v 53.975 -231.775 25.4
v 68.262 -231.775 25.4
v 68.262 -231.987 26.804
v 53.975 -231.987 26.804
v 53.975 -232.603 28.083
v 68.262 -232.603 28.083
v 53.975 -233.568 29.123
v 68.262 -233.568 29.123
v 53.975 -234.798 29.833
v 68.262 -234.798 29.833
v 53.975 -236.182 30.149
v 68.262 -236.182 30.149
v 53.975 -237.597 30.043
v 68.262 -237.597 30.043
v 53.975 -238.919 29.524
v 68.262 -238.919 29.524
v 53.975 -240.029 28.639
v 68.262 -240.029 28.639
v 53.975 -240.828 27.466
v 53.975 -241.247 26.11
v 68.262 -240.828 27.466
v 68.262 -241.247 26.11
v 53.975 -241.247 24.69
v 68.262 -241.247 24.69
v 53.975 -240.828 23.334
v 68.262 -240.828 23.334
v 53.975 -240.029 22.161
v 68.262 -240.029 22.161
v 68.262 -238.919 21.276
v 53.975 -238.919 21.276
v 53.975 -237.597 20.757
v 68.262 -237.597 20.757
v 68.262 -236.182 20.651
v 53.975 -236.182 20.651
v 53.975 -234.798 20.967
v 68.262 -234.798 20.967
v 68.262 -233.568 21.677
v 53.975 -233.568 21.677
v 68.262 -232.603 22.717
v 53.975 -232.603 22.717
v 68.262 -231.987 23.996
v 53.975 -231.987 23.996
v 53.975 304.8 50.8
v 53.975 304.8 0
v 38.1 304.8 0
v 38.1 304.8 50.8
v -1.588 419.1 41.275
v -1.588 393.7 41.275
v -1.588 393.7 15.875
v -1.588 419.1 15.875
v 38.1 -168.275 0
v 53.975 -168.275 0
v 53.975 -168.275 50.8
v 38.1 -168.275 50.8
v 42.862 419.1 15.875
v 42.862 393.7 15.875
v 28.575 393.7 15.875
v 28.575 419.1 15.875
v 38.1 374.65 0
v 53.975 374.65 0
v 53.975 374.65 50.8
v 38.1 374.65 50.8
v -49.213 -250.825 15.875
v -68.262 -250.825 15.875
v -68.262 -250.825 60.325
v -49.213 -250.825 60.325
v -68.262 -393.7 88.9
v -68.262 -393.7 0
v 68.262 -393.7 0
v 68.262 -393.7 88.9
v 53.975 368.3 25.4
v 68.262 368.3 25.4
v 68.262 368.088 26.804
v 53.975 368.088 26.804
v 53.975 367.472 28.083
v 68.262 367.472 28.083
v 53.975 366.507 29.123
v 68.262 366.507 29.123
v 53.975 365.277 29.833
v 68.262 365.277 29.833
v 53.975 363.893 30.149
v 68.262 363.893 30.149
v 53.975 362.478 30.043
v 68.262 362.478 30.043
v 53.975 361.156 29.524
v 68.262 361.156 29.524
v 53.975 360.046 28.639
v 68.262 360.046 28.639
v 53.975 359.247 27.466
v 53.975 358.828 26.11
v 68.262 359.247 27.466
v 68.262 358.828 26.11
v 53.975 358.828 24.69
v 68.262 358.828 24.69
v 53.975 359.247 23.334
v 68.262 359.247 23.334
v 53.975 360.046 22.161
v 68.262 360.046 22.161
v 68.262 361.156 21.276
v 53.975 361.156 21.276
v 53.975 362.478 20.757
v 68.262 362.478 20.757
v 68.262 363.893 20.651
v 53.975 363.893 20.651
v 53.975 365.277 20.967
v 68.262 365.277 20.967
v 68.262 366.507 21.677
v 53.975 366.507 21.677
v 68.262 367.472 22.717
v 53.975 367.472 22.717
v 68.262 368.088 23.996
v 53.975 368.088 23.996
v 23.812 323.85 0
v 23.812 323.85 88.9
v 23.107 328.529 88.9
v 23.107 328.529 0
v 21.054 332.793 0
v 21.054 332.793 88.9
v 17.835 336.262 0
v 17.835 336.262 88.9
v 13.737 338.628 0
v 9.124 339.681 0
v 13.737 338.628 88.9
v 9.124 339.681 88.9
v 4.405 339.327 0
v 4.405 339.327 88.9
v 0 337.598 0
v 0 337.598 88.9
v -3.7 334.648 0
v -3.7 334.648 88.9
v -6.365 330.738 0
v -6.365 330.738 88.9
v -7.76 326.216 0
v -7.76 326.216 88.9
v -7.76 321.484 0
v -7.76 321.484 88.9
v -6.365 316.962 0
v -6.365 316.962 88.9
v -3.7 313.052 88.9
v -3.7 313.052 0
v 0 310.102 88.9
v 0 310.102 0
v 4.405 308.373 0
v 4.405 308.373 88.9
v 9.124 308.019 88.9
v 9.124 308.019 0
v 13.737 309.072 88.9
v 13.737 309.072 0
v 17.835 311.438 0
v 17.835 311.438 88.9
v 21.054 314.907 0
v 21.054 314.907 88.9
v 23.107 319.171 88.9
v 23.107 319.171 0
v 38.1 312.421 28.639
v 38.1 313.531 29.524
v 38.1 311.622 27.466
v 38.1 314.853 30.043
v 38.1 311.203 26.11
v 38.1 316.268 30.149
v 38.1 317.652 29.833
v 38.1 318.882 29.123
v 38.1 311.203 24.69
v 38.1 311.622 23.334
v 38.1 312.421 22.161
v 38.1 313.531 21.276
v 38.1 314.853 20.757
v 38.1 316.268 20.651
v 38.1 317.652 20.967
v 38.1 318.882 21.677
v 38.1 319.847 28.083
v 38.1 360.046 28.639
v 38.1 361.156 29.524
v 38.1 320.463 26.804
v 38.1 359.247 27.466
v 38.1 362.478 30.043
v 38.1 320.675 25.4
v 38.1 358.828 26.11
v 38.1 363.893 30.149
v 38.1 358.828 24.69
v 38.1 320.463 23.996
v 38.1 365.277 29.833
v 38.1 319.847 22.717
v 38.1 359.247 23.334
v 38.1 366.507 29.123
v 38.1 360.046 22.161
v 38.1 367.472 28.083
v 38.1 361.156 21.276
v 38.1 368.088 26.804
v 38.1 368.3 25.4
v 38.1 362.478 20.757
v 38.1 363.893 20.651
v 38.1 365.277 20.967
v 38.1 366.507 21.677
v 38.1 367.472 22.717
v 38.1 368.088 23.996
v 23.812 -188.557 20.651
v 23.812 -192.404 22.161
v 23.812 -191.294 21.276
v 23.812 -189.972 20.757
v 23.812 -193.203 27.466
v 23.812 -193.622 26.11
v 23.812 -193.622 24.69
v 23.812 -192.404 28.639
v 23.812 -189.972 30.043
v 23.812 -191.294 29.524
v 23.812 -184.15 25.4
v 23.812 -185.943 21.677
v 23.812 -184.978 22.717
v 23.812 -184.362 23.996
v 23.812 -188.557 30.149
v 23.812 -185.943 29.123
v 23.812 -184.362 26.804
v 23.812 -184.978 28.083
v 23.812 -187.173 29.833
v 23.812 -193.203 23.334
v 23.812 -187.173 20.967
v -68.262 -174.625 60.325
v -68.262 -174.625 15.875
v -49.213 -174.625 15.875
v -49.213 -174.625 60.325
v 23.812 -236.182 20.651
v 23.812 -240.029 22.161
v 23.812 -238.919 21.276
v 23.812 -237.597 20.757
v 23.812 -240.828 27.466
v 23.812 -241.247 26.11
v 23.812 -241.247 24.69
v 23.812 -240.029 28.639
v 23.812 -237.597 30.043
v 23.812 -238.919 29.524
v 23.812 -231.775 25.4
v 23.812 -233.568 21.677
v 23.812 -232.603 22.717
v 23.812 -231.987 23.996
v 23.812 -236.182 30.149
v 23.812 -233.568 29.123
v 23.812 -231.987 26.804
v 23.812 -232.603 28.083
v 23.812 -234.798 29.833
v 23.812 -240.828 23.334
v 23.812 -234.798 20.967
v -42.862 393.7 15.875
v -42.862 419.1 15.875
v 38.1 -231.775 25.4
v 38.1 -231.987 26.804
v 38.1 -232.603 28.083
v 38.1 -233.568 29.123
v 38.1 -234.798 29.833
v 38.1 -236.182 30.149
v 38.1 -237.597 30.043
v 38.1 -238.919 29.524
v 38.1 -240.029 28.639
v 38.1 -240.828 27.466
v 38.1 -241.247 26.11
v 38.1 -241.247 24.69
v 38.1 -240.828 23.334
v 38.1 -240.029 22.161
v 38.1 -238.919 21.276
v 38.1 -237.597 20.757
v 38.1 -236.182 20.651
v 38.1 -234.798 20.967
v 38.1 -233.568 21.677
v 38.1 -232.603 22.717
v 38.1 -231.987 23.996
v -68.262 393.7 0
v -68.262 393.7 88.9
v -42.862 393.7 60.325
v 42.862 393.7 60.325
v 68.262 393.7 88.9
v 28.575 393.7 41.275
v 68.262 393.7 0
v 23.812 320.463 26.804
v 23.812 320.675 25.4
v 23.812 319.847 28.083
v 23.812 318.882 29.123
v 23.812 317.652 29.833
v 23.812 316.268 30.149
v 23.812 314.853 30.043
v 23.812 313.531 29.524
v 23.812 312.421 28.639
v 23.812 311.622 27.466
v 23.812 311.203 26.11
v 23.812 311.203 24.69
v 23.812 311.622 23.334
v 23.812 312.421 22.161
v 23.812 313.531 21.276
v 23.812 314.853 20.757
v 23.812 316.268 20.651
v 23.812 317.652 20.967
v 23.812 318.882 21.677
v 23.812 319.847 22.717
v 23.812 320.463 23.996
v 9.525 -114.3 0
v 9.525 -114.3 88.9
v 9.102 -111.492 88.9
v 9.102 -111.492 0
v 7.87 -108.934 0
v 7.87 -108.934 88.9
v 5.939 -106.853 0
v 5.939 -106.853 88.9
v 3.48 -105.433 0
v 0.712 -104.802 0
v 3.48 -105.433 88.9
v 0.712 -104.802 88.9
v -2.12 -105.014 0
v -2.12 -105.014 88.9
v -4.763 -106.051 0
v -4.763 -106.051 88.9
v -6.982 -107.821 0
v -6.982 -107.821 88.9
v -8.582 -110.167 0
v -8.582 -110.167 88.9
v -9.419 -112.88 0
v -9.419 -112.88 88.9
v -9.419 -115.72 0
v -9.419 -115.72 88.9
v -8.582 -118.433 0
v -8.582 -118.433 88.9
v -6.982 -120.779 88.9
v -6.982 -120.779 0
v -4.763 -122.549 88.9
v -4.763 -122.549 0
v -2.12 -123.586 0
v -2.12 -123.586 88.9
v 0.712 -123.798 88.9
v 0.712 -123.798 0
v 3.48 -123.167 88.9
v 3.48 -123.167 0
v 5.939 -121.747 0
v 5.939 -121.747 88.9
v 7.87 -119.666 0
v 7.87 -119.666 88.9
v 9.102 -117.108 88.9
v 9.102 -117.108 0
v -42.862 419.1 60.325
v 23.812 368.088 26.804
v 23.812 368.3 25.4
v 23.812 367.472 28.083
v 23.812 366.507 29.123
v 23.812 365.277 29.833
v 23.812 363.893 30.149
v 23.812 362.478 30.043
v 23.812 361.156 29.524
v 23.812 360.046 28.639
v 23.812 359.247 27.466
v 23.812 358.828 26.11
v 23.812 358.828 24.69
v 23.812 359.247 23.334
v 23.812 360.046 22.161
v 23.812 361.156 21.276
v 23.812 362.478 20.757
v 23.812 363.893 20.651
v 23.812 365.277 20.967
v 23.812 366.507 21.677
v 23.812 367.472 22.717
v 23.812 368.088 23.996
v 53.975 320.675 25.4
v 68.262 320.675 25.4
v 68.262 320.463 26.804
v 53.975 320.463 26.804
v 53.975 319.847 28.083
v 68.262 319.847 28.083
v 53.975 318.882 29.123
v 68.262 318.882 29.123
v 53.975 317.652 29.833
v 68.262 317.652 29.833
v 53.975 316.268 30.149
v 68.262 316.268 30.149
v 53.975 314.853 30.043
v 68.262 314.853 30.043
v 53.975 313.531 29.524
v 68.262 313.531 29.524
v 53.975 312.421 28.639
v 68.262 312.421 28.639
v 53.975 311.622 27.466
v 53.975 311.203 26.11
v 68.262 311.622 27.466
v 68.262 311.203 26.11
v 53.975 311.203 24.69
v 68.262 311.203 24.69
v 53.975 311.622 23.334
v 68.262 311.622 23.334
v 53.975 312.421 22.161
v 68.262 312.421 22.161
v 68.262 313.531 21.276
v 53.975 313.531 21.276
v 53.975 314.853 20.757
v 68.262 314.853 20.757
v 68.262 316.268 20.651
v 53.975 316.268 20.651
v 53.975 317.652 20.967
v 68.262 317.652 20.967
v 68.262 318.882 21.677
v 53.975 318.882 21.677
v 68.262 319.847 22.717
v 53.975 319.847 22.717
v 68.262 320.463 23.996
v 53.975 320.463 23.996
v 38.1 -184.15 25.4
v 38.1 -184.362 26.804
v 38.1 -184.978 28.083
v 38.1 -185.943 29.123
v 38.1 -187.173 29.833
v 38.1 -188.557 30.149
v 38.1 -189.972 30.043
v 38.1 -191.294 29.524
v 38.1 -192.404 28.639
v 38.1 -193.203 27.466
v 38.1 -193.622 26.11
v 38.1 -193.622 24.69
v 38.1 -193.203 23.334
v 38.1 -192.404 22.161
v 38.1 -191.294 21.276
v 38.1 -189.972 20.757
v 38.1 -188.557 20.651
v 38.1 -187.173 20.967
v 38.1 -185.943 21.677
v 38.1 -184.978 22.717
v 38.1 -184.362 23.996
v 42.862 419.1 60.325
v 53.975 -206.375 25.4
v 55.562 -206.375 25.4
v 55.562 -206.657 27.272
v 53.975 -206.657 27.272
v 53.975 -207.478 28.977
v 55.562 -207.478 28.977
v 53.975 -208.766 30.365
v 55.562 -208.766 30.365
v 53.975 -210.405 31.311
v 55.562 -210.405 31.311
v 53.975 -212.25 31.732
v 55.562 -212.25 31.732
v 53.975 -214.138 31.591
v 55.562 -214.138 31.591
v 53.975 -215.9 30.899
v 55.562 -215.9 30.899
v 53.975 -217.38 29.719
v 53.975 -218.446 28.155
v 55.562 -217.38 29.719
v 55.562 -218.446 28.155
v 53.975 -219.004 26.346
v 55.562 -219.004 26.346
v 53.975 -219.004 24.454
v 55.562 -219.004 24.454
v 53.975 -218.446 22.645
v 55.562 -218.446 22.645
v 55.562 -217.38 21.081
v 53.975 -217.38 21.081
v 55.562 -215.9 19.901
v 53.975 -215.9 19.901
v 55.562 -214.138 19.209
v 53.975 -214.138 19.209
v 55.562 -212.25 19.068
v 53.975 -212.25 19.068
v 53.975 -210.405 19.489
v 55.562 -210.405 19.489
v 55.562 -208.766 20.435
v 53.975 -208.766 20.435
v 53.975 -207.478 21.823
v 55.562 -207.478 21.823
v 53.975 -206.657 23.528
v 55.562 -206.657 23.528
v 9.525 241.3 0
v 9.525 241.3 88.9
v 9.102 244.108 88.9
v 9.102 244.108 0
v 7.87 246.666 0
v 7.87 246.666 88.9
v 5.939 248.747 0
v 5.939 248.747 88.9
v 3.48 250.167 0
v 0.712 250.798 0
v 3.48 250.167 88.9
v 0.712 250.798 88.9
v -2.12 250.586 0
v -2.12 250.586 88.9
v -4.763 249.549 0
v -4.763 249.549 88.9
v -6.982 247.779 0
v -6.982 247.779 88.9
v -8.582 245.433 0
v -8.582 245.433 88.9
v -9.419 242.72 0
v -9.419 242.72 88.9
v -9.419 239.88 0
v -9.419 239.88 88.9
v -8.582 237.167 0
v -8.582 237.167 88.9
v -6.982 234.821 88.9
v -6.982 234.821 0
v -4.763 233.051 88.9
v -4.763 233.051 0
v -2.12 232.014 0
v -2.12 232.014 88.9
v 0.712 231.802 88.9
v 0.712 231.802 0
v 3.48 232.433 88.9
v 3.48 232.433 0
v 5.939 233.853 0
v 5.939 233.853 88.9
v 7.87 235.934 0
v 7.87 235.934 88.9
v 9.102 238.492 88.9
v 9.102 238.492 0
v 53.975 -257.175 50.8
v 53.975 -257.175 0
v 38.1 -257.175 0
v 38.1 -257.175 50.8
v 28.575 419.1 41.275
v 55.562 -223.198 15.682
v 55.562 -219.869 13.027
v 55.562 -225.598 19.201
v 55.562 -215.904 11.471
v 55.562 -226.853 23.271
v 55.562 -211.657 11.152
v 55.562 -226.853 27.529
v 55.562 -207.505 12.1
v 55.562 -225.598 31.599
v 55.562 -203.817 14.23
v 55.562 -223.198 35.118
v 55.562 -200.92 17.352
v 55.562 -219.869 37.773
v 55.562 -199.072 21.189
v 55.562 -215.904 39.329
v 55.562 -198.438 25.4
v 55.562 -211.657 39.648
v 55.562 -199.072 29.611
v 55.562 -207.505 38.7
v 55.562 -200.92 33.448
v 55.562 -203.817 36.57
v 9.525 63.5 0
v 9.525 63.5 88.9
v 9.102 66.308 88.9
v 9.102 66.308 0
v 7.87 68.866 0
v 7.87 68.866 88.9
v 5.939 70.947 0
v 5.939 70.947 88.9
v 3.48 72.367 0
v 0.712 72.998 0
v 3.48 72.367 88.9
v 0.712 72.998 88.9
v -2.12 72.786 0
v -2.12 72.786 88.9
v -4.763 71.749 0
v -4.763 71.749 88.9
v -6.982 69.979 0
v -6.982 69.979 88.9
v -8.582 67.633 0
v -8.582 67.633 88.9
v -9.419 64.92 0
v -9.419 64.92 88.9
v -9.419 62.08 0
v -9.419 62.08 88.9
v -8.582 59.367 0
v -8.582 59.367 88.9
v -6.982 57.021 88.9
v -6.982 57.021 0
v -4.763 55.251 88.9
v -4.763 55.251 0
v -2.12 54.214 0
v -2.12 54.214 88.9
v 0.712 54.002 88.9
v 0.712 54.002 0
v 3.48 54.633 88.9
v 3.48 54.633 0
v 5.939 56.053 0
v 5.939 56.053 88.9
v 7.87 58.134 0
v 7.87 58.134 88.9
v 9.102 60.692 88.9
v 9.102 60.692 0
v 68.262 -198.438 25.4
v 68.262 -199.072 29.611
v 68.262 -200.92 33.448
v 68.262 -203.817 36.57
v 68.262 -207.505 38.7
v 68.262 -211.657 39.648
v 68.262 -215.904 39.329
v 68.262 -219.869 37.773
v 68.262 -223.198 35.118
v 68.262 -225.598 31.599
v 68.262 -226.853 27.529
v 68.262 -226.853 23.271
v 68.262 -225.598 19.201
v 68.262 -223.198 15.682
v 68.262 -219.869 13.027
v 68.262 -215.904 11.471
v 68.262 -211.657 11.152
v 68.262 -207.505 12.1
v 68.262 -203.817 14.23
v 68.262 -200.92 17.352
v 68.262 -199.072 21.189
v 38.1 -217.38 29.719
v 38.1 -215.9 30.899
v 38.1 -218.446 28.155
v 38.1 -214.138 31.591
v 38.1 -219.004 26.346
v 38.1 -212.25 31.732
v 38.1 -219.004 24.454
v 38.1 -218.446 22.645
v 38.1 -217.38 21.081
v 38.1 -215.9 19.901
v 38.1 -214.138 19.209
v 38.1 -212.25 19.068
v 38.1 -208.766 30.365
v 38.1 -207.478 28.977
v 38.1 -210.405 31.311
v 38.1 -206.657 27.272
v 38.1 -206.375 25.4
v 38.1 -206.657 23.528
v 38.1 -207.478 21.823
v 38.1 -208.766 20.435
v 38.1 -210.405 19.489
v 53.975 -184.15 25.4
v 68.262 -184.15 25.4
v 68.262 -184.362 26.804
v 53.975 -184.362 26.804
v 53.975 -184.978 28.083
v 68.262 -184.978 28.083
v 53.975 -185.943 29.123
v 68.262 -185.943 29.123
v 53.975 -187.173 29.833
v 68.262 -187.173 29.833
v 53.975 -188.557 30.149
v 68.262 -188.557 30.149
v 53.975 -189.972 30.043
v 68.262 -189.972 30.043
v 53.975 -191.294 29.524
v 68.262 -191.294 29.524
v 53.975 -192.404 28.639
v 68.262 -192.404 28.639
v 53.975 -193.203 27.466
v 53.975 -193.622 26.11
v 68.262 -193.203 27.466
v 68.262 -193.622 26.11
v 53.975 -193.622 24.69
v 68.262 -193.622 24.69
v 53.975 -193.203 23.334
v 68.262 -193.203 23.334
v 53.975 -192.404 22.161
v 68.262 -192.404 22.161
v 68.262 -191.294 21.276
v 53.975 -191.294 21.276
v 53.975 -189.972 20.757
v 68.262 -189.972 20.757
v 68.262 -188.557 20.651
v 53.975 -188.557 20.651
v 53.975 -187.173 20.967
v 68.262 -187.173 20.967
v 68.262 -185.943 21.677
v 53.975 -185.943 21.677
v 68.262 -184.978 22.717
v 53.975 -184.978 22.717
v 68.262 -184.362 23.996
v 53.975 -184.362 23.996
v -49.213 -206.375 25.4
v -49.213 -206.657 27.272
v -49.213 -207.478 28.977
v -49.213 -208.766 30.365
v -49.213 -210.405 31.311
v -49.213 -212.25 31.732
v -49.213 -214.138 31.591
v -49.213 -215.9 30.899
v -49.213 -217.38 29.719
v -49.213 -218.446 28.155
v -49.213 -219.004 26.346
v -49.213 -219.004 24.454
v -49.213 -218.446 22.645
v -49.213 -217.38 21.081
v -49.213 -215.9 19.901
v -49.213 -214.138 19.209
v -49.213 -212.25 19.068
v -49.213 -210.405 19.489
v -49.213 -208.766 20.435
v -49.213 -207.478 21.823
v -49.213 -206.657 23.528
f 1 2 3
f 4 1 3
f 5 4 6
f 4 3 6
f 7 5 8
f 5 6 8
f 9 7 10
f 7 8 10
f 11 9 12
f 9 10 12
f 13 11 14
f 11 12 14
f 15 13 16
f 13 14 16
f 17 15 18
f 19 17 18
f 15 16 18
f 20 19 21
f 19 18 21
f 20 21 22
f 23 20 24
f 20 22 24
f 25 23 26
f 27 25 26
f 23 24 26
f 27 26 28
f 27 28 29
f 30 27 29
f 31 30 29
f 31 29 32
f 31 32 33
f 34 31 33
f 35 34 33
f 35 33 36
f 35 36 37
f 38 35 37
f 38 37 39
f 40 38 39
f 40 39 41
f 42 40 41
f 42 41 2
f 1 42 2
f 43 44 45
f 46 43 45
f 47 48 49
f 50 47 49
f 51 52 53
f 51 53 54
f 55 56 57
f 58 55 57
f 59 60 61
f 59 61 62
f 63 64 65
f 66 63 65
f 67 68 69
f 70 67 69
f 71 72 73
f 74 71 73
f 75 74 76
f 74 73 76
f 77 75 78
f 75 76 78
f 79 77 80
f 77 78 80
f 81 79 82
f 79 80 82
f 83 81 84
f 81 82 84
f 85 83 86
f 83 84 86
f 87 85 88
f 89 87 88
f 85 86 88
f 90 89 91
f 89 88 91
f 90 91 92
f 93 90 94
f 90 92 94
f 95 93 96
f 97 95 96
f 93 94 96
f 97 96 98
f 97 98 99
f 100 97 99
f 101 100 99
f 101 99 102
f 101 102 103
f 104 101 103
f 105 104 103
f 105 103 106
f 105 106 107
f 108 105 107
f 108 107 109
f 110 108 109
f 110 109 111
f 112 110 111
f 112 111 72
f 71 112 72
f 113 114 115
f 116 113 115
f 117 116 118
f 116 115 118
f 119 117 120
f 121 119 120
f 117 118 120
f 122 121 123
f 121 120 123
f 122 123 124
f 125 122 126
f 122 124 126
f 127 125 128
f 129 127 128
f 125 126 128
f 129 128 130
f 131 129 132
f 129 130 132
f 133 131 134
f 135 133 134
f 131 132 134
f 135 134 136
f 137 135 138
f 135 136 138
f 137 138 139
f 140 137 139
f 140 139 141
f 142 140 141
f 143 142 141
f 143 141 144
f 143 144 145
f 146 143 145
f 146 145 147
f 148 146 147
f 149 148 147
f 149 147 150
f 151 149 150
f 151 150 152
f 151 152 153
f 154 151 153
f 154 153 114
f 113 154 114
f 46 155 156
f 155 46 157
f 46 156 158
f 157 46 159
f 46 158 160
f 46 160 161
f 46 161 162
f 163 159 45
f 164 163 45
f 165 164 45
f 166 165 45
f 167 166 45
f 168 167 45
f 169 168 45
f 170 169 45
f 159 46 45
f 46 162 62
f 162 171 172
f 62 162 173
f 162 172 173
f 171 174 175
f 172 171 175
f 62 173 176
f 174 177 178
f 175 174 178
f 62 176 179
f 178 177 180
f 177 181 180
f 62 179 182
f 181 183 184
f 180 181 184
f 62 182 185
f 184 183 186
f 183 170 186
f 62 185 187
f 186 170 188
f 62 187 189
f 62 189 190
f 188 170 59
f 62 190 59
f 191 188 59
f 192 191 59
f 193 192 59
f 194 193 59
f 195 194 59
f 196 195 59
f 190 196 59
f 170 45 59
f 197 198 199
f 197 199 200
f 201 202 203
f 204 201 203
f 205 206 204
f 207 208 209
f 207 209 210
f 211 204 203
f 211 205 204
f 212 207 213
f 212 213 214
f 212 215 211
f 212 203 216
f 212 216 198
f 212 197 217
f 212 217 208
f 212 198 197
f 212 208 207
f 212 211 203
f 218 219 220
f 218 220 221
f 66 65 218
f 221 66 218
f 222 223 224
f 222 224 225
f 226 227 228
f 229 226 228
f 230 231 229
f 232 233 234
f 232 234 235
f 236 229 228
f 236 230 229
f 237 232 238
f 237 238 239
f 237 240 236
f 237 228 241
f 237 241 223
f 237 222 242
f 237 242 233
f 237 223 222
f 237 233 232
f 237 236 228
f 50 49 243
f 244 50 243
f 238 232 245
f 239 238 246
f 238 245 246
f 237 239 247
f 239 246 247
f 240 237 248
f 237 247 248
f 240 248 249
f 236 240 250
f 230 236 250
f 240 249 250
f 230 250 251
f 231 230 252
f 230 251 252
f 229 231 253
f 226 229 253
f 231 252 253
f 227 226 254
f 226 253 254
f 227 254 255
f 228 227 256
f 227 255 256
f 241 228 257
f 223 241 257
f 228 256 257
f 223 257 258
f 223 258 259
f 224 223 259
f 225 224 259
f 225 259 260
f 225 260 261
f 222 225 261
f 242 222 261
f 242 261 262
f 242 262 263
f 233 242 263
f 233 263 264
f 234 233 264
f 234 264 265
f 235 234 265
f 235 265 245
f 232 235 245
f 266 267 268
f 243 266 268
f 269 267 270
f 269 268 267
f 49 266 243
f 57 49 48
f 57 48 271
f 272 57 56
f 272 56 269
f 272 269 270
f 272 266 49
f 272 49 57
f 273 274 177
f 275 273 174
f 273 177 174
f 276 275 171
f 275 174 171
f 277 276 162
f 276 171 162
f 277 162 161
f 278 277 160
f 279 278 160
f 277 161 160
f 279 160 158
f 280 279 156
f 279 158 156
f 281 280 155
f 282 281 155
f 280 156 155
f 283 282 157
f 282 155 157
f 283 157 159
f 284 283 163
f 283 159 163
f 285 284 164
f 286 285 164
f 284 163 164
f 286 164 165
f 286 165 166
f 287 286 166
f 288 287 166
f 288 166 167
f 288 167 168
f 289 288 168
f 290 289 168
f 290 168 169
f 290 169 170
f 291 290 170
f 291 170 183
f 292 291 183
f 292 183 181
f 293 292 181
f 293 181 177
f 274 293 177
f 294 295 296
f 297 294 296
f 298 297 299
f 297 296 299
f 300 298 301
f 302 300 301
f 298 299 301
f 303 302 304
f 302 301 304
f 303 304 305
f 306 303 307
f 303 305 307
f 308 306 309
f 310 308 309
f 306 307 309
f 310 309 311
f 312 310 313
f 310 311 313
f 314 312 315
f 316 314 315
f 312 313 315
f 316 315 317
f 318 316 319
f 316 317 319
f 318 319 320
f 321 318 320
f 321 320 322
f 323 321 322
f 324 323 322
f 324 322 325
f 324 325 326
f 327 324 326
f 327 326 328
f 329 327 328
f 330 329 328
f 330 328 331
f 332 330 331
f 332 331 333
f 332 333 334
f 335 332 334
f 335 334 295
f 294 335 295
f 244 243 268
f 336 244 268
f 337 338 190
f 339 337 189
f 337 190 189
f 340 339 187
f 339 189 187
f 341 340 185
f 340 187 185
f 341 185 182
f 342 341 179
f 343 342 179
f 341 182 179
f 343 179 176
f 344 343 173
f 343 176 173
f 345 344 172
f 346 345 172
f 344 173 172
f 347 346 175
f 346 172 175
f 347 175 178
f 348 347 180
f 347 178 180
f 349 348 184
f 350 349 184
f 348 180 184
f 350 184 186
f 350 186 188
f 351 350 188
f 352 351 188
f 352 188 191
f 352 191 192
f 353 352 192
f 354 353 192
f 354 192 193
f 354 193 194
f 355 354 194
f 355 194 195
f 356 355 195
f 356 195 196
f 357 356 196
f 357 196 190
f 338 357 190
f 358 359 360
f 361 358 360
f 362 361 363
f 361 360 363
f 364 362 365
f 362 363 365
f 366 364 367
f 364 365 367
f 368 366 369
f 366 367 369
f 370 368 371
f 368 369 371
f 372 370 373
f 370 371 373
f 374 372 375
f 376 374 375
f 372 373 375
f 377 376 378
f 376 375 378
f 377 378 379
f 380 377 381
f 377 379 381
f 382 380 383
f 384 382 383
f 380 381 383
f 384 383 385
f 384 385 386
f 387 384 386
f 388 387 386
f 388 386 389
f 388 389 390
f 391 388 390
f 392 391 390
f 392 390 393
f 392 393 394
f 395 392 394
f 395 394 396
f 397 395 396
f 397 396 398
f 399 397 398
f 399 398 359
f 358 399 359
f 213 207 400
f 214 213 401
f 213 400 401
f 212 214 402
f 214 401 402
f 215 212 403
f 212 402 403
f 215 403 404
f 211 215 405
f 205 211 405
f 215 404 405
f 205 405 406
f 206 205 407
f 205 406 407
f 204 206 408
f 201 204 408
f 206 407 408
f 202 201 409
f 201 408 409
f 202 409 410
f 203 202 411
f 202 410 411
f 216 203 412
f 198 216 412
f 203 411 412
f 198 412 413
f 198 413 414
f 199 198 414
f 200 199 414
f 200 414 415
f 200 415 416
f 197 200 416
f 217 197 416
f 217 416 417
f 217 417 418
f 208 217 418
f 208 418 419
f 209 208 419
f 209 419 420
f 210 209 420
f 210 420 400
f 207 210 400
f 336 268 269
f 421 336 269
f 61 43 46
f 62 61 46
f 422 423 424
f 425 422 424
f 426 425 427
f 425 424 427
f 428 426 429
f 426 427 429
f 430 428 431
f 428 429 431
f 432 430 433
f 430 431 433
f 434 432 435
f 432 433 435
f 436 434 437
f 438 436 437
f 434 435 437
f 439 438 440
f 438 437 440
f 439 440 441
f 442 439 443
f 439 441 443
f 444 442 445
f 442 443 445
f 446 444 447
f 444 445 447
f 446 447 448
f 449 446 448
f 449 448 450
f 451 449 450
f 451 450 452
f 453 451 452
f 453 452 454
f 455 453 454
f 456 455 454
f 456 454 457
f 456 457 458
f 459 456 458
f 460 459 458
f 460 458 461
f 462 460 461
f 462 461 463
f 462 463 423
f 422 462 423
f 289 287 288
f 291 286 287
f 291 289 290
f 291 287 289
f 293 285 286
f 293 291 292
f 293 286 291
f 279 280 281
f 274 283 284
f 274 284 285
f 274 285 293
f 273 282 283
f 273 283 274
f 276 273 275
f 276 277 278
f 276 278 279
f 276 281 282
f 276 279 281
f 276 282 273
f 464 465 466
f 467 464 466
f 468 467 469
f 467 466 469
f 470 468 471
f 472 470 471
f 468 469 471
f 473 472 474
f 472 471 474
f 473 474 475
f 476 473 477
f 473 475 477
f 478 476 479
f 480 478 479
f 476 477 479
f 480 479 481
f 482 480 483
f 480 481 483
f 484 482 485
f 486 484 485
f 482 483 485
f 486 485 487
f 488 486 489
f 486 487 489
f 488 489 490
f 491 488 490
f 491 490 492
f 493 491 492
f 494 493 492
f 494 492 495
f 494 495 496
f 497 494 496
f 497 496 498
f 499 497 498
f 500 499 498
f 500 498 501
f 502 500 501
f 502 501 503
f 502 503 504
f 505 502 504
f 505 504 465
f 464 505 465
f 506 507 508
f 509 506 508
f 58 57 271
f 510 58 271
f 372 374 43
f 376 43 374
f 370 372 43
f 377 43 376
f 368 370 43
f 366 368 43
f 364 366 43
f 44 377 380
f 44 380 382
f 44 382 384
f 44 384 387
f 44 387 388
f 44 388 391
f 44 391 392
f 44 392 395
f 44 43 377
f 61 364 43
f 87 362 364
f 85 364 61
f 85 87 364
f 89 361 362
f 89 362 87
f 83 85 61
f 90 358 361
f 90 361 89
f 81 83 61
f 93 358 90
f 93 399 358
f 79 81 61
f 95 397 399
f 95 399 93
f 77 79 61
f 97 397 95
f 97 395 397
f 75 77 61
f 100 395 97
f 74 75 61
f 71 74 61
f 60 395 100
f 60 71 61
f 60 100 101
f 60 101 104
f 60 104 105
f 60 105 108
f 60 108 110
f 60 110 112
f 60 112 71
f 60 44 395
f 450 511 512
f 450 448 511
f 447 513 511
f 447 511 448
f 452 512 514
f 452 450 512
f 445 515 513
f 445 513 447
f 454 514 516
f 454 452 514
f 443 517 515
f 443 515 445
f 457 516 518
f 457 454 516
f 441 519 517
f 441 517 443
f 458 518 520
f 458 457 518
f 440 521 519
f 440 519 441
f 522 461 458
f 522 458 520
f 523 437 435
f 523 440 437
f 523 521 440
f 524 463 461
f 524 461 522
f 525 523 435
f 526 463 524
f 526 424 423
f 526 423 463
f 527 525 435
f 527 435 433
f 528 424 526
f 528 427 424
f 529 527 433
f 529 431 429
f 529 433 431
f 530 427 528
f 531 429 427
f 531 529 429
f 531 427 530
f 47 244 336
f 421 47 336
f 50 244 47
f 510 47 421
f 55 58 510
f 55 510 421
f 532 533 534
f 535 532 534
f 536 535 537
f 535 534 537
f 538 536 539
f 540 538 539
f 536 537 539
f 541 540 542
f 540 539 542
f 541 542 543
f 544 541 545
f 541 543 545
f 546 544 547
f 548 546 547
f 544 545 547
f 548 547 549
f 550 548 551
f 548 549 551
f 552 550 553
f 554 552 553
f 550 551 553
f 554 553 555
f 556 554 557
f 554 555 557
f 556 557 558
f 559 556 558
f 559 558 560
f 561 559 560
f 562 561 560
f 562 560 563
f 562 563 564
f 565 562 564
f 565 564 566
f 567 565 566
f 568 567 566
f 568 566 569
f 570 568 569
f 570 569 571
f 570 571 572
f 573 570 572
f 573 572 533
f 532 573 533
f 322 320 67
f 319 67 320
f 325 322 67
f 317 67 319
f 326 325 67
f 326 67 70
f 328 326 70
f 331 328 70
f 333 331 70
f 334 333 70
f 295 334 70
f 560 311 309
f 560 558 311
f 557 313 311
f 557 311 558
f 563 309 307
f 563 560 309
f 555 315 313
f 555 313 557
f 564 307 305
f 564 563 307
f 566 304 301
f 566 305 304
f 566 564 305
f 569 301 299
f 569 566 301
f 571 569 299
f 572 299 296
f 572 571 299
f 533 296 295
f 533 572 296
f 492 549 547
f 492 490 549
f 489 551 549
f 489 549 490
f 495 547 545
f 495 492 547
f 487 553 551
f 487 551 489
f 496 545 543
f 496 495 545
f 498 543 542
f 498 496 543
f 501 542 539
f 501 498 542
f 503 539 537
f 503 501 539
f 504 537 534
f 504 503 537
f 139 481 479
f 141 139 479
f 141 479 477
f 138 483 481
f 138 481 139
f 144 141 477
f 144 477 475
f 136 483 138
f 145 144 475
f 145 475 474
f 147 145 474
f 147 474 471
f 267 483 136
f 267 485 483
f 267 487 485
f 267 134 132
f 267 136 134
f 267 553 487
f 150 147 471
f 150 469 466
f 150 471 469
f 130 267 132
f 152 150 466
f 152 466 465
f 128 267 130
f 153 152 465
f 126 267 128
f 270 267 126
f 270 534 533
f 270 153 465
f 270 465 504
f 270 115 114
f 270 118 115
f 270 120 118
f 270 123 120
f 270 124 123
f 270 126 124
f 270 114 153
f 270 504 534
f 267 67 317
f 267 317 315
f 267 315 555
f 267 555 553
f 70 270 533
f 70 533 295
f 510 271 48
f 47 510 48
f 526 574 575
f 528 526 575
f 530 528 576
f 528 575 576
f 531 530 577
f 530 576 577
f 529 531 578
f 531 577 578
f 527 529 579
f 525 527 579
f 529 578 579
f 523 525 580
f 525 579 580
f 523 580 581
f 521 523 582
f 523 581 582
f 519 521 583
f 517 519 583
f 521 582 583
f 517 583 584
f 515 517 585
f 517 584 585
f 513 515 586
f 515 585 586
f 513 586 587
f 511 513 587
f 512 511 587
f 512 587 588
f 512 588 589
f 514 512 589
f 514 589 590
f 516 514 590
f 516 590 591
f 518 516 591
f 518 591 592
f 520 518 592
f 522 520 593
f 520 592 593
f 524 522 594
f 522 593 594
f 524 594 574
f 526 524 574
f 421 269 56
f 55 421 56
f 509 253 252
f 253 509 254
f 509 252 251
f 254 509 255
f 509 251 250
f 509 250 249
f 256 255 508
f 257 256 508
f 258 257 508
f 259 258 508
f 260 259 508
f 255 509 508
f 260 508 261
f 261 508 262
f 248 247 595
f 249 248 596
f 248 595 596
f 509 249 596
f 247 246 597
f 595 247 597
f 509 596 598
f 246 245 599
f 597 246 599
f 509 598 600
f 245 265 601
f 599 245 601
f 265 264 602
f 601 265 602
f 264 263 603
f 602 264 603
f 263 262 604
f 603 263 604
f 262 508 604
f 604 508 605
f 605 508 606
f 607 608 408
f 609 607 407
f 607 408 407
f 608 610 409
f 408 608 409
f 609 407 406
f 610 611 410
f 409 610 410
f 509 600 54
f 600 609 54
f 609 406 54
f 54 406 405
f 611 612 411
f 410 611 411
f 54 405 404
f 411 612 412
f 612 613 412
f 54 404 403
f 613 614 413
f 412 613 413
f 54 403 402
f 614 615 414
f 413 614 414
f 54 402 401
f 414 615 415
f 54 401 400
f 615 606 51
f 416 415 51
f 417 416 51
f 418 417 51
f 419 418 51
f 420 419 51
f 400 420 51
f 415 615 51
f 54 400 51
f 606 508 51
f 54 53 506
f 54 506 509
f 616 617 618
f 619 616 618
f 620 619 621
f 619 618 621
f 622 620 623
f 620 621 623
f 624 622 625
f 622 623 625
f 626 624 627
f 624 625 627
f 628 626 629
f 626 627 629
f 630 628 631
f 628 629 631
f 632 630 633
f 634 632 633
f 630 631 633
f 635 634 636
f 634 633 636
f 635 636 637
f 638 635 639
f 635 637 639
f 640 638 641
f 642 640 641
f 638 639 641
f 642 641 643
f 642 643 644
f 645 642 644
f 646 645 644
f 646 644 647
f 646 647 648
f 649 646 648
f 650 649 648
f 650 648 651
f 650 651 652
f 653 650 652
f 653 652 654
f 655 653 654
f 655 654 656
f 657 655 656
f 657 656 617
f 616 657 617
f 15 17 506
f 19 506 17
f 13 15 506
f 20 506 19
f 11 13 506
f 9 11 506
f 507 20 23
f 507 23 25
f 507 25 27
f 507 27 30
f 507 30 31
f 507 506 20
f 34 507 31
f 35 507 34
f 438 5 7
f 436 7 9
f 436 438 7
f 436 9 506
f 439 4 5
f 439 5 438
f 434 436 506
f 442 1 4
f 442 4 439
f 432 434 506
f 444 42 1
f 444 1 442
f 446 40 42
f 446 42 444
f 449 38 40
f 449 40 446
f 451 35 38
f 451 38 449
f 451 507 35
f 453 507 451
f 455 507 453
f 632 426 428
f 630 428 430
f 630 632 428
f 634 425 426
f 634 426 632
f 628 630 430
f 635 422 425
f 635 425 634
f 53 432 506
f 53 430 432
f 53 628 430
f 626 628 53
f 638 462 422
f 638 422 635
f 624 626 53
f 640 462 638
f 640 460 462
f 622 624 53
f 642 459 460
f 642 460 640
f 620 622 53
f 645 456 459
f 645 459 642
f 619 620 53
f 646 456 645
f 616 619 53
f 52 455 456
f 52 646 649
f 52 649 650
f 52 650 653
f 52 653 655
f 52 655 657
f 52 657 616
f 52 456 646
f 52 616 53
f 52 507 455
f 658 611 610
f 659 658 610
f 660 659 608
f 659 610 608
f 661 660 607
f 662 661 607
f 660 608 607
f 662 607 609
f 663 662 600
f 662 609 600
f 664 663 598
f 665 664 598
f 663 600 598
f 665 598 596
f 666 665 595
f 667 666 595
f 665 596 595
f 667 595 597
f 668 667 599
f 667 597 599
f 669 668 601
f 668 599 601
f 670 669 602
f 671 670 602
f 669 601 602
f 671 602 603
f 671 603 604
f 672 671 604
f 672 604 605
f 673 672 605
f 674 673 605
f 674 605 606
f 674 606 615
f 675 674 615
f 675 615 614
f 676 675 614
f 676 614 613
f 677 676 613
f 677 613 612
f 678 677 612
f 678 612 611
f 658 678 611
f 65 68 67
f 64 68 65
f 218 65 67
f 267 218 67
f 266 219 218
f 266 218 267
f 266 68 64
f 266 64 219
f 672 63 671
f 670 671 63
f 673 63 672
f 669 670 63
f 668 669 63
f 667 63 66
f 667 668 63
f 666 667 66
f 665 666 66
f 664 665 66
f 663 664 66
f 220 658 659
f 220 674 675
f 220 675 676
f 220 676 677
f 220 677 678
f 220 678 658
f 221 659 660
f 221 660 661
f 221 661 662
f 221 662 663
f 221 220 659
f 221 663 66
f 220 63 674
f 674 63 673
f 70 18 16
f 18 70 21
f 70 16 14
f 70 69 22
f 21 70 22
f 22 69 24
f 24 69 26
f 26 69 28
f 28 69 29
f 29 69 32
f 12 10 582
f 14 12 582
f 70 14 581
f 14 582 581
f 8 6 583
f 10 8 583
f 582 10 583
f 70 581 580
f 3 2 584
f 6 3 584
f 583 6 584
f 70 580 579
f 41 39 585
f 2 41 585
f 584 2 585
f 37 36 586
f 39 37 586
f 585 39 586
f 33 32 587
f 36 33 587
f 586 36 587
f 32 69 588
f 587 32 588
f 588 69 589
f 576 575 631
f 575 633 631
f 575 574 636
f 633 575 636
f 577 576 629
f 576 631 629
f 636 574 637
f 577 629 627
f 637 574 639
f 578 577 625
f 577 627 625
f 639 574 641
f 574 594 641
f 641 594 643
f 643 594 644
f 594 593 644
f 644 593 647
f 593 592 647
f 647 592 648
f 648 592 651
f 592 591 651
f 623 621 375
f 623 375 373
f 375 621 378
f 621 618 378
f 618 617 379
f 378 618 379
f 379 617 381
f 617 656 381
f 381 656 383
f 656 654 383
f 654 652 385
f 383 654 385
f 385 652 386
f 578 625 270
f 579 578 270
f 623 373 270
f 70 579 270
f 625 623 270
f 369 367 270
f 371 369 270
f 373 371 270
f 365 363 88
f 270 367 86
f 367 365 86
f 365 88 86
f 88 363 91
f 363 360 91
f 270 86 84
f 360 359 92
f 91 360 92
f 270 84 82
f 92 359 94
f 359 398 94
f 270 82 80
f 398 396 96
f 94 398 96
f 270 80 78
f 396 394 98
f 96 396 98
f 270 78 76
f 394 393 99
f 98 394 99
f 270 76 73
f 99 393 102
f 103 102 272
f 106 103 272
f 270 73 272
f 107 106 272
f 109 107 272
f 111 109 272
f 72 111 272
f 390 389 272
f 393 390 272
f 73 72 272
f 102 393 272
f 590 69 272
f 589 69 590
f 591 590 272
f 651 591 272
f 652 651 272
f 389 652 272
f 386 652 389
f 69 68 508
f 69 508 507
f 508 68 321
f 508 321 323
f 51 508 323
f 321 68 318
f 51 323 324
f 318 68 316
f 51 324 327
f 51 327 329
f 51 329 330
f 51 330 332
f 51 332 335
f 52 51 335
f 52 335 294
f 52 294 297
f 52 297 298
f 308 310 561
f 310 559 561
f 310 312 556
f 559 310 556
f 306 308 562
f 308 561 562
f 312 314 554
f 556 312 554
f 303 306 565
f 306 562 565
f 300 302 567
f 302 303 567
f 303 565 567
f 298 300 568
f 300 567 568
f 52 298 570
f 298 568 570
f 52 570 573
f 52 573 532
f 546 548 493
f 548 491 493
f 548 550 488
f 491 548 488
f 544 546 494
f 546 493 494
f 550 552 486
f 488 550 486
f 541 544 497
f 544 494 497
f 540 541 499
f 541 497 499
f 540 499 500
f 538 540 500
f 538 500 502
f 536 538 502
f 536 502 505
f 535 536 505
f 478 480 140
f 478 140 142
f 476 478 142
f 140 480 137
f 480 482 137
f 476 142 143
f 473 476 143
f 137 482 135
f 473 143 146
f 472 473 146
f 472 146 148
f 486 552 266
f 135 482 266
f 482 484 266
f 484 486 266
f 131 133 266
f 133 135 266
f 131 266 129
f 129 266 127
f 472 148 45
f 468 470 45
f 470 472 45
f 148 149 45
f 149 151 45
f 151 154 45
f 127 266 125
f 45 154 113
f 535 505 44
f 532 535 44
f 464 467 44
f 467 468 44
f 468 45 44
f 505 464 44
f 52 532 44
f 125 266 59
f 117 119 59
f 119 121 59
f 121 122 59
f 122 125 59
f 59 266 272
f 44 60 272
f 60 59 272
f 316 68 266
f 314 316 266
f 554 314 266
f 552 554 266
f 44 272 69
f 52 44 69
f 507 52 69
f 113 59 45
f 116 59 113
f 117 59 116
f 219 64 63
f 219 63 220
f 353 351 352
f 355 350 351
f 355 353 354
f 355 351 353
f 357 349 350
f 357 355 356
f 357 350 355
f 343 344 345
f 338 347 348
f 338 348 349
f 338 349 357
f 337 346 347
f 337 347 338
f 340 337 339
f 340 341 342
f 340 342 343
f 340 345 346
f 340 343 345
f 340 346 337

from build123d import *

# Parameters (mm, degrees)
SKETCH1_W           = 136.525
SKETCH1_H           = 787.4
BOSS_EXTRUDE1_DEPTH = 88.9
BOSS_EXTRUDE2_DEPTH = 25.4
SKETCH3_R           = 9.525
SKETCH3_R_2         = 15.875
CUT_EXTRUDE1_DEPTH  = 434.829216289
SKETCH5_W           = 44.45
SKETCH5_H           = 76.2
CUT_EXTRUDE2_DEPTH  = 19.05
SKETCH6_W           = 15.875
SKETCH6_H           = 69.85
SKETCH6_H_2         = 88.9
CUT_EXTRUDE3_DEPTH  = 50.8
SKETCH7_R           = 4.7625
CUT_EXTRUDE4_DEPTH  = 44.45
SKETCH7_3_R         = 6.35
CUT_EXTRUDE5_DEPTH  = 450.652194062
SKETCH8_R           = 14.2875
CUT_EXTRUDE6_DEPTH  = 12.7


with BuildPart() as part:
    # Sketch1 → Boss-Extrude1 (new body)
    with BuildSketch(Plane.XY):
        Rectangle(SKETCH1_W, SKETCH1_H)
    extrude(amount=BOSS_EXTRUDE1_DEPTH)

    # Sketch2 → Boss-Extrude2 (add)
    with BuildSketch(Plane(origin=(0, 393.7, 0), x_dir=(1, 0, 0), z_dir=(0, 1, 0))):
        Polygon((-42.8625, -60.325), (42.8625, -60.325), (42.8625, -15.875), (28.575, -15.875), (28.575, -41.275), (-1.5875, -41.275), (-1.5875, -15.875), (-42.8625, -15.875), align=None)
    extrude(amount=BOSS_EXTRUDE2_DEPTH)

    # Sketch3 → Cut-Extrude1 (cut, through all)
    with BuildSketch(Plane.XY.offset(88.9)):
        with Locations((0, 63.5)):
            Circle(SKETCH3_R)
        with Locations((0, -114.3)):
            Circle(SKETCH3_R)
        with Locations((0, 241.3)):
            Circle(SKETCH3_R)
        with Locations((7.9375, 323.85)):
            Circle(SKETCH3_R_2)
    extrude(amount=-CUT_EXTRUDE1_DEPTH, mode=Mode.SUBTRACT)

    # Sketch5 → Cut-Extrude2 (cut)
    with BuildSketch(Plane.ZY.offset(68.2625)):
        with Locations((38.1, -212.725)):
            Rectangle(SKETCH5_W, SKETCH5_H)
    extrude(amount=-CUT_EXTRUDE2_DEPTH, mode=Mode.SUBTRACT)

    # Sketch6 → Cut-Extrude3 (cut)
    with BuildSketch(Plane(origin=(0, 0, 0), x_dir=(-1, 0, 0), z_dir=(0, 0, -1))):
        with Locations((-46.0375, 339.725)):
            Rectangle(SKETCH6_W, SKETCH6_H)
        with Locations((-46.0375, -212.725)):
            Rectangle(SKETCH6_W, SKETCH6_H_2)
    extrude(amount=-CUT_EXTRUDE3_DEPTH, mode=Mode.SUBTRACT)

    # Sketch7 → Cut-Extrude4 (cut)
    with BuildSketch(Plane(origin=(68.2625, 0, 0), x_dir=(0, 0, -1), z_dir=(1, 0, 0))):
        with Locations((-25.4, -188.9125)):
            Circle(SKETCH7_R)
        with Locations((-25.4, -236.5375)):
            Circle(SKETCH7_R)
        with Locations((-25.4, 363.5375)):
            Circle(SKETCH7_R)
        with Locations((-25.4, 315.9125)):
            Circle(SKETCH7_R)
    extrude(amount=-CUT_EXTRUDE4_DEPTH, mode=Mode.SUBTRACT)

    # Sketch7<3> → Cut-Extrude5 (cut, through all)
    with BuildSketch(Plane(origin=(68.2625, 0, 0), x_dir=(0, 0, -1), z_dir=(1, 0, 0))):
        with Locations((-25.4, -212.725)):
            Circle(SKETCH7_3_R)
    extrude(amount=-CUT_EXTRUDE5_DEPTH, mode=Mode.SUBTRACT)

    # Sketch8 → Cut-Extrude6 (cut)
    with BuildSketch(Plane(origin=(68.2625, 0, 0), x_dir=(0, 0, -1), z_dir=(1, 0, 0))):
        with Locations((-25.4, -212.725)):
            Circle(SKETCH8_R)
    extrude(amount=-CUT_EXTRUDE6_DEPTH, mode=Mode.SUBTRACT)


solid = part.part
